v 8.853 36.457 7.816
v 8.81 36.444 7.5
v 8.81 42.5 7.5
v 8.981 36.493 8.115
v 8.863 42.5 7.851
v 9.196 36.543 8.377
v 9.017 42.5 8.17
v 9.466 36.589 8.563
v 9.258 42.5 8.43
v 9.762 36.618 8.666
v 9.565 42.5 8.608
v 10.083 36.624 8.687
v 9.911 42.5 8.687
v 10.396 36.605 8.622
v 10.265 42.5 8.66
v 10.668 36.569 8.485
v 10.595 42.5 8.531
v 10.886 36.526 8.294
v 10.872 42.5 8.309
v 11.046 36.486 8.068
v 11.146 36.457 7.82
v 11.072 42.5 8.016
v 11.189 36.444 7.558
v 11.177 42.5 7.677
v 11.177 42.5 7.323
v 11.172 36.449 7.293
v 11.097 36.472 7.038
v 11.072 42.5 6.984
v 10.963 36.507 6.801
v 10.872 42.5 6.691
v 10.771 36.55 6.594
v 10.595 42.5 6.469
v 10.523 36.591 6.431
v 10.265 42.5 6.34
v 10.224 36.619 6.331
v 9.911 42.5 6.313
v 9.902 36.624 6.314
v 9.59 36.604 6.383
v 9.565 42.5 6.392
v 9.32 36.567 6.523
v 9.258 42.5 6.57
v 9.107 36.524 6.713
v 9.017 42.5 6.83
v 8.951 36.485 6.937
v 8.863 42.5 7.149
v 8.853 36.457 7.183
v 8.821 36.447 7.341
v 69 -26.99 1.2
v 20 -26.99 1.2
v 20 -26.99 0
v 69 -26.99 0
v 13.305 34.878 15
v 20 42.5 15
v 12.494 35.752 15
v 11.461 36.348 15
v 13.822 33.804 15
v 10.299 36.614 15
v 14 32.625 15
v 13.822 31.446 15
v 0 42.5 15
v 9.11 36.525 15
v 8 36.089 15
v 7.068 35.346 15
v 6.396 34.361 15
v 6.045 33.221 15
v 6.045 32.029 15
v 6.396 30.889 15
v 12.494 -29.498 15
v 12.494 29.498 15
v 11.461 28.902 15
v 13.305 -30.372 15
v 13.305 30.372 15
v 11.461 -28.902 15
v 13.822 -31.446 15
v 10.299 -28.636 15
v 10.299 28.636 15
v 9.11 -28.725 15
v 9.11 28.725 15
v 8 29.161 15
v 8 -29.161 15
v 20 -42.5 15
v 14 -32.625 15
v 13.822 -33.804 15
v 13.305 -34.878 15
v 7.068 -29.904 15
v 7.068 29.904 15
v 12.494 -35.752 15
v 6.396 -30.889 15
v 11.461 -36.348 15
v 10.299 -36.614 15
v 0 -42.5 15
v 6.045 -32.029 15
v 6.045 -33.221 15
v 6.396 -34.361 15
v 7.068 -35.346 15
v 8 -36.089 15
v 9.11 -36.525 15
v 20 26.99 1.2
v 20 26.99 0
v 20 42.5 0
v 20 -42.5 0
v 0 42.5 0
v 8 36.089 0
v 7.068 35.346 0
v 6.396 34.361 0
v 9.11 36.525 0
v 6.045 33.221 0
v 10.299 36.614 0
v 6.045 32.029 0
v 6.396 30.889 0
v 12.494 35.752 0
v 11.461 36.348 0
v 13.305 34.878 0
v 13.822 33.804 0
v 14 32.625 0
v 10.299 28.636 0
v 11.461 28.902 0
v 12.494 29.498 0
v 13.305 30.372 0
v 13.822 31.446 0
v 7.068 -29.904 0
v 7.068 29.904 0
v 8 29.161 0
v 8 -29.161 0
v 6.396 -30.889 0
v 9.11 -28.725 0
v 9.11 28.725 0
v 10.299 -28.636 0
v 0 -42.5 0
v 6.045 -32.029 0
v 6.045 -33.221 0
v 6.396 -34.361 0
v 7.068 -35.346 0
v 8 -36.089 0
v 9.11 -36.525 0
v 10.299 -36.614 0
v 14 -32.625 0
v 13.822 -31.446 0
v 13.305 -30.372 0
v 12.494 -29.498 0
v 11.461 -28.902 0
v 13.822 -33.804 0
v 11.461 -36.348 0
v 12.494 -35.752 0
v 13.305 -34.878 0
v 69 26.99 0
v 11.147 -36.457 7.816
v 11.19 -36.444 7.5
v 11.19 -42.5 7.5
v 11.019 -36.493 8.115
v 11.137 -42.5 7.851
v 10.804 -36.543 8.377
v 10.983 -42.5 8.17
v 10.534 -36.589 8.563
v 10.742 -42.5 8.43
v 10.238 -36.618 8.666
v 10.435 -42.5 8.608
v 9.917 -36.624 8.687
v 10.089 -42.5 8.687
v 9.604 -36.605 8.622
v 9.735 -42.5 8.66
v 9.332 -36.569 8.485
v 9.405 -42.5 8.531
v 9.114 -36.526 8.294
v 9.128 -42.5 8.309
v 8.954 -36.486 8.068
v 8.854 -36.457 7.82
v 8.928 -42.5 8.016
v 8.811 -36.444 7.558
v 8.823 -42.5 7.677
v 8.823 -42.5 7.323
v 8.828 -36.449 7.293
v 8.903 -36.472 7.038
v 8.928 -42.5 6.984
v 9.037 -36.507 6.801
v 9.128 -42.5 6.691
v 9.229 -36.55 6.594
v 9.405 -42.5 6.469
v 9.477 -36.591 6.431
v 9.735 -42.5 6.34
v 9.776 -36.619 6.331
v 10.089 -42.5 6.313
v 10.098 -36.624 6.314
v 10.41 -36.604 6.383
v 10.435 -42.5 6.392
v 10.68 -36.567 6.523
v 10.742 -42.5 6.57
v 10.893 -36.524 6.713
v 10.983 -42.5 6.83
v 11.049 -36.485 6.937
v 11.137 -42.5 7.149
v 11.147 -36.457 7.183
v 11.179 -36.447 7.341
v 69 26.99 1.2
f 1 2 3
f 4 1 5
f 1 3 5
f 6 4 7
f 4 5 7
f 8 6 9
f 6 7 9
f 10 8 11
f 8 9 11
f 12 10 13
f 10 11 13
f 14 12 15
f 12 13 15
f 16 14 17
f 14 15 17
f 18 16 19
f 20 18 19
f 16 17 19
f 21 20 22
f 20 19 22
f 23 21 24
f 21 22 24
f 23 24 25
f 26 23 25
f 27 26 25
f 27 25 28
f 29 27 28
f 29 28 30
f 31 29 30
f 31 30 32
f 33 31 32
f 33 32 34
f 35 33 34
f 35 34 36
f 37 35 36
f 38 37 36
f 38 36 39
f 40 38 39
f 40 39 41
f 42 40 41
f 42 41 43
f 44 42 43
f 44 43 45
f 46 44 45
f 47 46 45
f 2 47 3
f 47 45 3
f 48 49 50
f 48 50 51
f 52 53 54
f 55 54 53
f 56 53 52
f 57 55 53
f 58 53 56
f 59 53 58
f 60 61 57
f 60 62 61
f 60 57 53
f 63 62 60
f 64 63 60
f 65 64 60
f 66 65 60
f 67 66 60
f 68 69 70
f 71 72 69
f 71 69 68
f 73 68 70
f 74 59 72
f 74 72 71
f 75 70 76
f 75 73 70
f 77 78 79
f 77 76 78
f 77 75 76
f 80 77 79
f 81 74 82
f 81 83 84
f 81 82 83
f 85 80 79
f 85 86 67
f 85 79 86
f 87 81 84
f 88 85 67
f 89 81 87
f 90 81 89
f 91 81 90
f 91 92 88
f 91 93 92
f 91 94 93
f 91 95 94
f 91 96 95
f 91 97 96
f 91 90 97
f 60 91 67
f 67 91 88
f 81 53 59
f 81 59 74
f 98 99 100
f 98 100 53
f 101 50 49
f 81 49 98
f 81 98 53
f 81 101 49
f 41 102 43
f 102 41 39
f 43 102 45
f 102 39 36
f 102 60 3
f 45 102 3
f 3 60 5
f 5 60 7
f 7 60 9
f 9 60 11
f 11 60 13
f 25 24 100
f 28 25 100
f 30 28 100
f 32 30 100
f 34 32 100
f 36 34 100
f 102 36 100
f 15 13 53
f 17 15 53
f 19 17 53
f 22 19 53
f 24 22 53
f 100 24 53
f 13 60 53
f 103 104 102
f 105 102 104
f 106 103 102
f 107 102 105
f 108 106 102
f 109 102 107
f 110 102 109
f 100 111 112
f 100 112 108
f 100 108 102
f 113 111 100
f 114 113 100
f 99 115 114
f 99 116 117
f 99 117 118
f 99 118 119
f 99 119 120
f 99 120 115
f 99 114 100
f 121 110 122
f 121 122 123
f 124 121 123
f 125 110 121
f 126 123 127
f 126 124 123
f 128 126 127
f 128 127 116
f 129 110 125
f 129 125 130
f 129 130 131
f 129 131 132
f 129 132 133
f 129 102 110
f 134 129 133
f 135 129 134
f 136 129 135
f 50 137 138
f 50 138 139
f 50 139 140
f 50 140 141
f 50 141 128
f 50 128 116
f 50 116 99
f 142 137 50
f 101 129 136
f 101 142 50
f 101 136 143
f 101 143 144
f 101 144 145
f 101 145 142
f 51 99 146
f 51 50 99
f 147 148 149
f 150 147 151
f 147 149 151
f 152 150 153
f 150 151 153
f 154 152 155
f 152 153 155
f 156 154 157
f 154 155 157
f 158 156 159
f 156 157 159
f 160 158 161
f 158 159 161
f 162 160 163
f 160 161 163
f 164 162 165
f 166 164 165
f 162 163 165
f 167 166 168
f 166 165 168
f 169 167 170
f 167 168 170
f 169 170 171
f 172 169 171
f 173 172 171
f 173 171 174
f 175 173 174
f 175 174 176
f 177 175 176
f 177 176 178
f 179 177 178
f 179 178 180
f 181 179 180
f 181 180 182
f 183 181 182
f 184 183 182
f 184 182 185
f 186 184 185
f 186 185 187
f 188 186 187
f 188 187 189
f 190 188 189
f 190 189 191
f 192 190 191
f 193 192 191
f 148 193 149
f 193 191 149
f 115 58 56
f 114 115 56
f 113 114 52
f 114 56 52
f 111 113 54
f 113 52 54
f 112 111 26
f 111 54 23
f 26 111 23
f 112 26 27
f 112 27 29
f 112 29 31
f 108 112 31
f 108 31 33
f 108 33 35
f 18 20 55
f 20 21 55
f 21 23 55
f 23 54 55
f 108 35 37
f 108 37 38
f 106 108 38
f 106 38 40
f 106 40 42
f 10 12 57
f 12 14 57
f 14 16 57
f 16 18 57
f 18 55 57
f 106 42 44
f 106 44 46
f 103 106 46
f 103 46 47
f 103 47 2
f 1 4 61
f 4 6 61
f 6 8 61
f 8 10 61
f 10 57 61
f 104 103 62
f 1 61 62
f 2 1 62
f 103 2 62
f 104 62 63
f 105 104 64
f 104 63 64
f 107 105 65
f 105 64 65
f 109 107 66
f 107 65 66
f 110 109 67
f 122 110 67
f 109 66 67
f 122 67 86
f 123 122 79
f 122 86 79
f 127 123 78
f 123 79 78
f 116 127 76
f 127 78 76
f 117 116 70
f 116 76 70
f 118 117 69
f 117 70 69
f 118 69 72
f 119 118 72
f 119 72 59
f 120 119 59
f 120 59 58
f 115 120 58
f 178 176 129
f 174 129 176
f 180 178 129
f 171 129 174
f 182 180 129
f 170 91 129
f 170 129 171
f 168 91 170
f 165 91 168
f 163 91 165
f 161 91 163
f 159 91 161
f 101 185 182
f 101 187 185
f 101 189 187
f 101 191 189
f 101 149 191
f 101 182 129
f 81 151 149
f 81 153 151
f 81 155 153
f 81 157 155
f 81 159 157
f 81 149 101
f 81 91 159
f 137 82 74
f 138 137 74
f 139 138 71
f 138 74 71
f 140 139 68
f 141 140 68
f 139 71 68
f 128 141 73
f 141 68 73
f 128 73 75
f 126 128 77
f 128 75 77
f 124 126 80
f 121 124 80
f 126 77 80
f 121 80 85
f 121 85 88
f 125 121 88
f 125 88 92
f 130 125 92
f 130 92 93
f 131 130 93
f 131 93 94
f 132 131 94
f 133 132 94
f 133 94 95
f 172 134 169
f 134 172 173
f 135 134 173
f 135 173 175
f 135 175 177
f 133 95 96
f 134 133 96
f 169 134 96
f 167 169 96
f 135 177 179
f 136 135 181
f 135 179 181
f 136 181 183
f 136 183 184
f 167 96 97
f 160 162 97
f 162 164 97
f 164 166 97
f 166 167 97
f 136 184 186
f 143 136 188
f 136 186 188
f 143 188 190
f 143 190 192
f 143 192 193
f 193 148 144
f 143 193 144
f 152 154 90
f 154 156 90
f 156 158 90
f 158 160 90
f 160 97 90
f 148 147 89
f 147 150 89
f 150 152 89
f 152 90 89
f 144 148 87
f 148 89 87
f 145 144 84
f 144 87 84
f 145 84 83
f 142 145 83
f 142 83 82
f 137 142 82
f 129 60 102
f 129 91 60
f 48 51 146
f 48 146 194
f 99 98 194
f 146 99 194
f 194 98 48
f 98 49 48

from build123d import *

# Parameters (mm, degrees)
F0_W     = 49
F0_H     = 1.2
F1_DEPTH = 26.99
F2_DEPTH = 42.5
F4_R     = 4
F5_DEPTH = 25
F6_R     = 1.19
F7_DEPTH = 8
F8_R     = 1.19
F9_DEPTH = 8


with BuildPart() as f1:
    # F0 (on Front) → F1 (new body, symmetric)
    with BuildSketch(Plane.XZ):
        with Locations((44.5, 0.6)):
            Rectangle(F0_W, F0_H)
    extrude(amount=F1_DEPTH, both=True)

    # F0 (on Front) → F2 (join, symmetric)
    with BuildSketch(Plane.XZ):
        Polygon((0, 15), (0, 0), (20, 0), (20, 1.2), (20, 15), align=None)
    extrude(amount=F2_DEPTH, both=True)

    # F4 (on offset) → F5 (cut)
    with BuildSketch(Plane.XY.offset(15)):
        with Locations((10, -32.625)):
            Circle(F4_R)
        with Locations((10, 32.625)):
            Circle(F4_R)
    extrude(amount=-F5_DEPTH, mode=Mode.SUBTRACT)

    # F6 (on face) → F7 (cut)
    with BuildSketch(Plane.XZ.offset(42.5)):
        with Locations((10, 7.5)):
            Circle(F6_R)
    extrude(amount=-F7_DEPTH, mode=Mode.SUBTRACT)

    # F8 (on face) → F9 (cut)
    with BuildSketch(Plane(origin=(0, 42.5, 0), x_dir=(-1, 0, 0), z_dir=(0, 1, 0))):
        with Locations((-10, 7.5)):
            Circle(F8_R)
    extrude(amount=-F9_DEPTH, mode=Mode.SUBTRACT)


solid = f1.part
